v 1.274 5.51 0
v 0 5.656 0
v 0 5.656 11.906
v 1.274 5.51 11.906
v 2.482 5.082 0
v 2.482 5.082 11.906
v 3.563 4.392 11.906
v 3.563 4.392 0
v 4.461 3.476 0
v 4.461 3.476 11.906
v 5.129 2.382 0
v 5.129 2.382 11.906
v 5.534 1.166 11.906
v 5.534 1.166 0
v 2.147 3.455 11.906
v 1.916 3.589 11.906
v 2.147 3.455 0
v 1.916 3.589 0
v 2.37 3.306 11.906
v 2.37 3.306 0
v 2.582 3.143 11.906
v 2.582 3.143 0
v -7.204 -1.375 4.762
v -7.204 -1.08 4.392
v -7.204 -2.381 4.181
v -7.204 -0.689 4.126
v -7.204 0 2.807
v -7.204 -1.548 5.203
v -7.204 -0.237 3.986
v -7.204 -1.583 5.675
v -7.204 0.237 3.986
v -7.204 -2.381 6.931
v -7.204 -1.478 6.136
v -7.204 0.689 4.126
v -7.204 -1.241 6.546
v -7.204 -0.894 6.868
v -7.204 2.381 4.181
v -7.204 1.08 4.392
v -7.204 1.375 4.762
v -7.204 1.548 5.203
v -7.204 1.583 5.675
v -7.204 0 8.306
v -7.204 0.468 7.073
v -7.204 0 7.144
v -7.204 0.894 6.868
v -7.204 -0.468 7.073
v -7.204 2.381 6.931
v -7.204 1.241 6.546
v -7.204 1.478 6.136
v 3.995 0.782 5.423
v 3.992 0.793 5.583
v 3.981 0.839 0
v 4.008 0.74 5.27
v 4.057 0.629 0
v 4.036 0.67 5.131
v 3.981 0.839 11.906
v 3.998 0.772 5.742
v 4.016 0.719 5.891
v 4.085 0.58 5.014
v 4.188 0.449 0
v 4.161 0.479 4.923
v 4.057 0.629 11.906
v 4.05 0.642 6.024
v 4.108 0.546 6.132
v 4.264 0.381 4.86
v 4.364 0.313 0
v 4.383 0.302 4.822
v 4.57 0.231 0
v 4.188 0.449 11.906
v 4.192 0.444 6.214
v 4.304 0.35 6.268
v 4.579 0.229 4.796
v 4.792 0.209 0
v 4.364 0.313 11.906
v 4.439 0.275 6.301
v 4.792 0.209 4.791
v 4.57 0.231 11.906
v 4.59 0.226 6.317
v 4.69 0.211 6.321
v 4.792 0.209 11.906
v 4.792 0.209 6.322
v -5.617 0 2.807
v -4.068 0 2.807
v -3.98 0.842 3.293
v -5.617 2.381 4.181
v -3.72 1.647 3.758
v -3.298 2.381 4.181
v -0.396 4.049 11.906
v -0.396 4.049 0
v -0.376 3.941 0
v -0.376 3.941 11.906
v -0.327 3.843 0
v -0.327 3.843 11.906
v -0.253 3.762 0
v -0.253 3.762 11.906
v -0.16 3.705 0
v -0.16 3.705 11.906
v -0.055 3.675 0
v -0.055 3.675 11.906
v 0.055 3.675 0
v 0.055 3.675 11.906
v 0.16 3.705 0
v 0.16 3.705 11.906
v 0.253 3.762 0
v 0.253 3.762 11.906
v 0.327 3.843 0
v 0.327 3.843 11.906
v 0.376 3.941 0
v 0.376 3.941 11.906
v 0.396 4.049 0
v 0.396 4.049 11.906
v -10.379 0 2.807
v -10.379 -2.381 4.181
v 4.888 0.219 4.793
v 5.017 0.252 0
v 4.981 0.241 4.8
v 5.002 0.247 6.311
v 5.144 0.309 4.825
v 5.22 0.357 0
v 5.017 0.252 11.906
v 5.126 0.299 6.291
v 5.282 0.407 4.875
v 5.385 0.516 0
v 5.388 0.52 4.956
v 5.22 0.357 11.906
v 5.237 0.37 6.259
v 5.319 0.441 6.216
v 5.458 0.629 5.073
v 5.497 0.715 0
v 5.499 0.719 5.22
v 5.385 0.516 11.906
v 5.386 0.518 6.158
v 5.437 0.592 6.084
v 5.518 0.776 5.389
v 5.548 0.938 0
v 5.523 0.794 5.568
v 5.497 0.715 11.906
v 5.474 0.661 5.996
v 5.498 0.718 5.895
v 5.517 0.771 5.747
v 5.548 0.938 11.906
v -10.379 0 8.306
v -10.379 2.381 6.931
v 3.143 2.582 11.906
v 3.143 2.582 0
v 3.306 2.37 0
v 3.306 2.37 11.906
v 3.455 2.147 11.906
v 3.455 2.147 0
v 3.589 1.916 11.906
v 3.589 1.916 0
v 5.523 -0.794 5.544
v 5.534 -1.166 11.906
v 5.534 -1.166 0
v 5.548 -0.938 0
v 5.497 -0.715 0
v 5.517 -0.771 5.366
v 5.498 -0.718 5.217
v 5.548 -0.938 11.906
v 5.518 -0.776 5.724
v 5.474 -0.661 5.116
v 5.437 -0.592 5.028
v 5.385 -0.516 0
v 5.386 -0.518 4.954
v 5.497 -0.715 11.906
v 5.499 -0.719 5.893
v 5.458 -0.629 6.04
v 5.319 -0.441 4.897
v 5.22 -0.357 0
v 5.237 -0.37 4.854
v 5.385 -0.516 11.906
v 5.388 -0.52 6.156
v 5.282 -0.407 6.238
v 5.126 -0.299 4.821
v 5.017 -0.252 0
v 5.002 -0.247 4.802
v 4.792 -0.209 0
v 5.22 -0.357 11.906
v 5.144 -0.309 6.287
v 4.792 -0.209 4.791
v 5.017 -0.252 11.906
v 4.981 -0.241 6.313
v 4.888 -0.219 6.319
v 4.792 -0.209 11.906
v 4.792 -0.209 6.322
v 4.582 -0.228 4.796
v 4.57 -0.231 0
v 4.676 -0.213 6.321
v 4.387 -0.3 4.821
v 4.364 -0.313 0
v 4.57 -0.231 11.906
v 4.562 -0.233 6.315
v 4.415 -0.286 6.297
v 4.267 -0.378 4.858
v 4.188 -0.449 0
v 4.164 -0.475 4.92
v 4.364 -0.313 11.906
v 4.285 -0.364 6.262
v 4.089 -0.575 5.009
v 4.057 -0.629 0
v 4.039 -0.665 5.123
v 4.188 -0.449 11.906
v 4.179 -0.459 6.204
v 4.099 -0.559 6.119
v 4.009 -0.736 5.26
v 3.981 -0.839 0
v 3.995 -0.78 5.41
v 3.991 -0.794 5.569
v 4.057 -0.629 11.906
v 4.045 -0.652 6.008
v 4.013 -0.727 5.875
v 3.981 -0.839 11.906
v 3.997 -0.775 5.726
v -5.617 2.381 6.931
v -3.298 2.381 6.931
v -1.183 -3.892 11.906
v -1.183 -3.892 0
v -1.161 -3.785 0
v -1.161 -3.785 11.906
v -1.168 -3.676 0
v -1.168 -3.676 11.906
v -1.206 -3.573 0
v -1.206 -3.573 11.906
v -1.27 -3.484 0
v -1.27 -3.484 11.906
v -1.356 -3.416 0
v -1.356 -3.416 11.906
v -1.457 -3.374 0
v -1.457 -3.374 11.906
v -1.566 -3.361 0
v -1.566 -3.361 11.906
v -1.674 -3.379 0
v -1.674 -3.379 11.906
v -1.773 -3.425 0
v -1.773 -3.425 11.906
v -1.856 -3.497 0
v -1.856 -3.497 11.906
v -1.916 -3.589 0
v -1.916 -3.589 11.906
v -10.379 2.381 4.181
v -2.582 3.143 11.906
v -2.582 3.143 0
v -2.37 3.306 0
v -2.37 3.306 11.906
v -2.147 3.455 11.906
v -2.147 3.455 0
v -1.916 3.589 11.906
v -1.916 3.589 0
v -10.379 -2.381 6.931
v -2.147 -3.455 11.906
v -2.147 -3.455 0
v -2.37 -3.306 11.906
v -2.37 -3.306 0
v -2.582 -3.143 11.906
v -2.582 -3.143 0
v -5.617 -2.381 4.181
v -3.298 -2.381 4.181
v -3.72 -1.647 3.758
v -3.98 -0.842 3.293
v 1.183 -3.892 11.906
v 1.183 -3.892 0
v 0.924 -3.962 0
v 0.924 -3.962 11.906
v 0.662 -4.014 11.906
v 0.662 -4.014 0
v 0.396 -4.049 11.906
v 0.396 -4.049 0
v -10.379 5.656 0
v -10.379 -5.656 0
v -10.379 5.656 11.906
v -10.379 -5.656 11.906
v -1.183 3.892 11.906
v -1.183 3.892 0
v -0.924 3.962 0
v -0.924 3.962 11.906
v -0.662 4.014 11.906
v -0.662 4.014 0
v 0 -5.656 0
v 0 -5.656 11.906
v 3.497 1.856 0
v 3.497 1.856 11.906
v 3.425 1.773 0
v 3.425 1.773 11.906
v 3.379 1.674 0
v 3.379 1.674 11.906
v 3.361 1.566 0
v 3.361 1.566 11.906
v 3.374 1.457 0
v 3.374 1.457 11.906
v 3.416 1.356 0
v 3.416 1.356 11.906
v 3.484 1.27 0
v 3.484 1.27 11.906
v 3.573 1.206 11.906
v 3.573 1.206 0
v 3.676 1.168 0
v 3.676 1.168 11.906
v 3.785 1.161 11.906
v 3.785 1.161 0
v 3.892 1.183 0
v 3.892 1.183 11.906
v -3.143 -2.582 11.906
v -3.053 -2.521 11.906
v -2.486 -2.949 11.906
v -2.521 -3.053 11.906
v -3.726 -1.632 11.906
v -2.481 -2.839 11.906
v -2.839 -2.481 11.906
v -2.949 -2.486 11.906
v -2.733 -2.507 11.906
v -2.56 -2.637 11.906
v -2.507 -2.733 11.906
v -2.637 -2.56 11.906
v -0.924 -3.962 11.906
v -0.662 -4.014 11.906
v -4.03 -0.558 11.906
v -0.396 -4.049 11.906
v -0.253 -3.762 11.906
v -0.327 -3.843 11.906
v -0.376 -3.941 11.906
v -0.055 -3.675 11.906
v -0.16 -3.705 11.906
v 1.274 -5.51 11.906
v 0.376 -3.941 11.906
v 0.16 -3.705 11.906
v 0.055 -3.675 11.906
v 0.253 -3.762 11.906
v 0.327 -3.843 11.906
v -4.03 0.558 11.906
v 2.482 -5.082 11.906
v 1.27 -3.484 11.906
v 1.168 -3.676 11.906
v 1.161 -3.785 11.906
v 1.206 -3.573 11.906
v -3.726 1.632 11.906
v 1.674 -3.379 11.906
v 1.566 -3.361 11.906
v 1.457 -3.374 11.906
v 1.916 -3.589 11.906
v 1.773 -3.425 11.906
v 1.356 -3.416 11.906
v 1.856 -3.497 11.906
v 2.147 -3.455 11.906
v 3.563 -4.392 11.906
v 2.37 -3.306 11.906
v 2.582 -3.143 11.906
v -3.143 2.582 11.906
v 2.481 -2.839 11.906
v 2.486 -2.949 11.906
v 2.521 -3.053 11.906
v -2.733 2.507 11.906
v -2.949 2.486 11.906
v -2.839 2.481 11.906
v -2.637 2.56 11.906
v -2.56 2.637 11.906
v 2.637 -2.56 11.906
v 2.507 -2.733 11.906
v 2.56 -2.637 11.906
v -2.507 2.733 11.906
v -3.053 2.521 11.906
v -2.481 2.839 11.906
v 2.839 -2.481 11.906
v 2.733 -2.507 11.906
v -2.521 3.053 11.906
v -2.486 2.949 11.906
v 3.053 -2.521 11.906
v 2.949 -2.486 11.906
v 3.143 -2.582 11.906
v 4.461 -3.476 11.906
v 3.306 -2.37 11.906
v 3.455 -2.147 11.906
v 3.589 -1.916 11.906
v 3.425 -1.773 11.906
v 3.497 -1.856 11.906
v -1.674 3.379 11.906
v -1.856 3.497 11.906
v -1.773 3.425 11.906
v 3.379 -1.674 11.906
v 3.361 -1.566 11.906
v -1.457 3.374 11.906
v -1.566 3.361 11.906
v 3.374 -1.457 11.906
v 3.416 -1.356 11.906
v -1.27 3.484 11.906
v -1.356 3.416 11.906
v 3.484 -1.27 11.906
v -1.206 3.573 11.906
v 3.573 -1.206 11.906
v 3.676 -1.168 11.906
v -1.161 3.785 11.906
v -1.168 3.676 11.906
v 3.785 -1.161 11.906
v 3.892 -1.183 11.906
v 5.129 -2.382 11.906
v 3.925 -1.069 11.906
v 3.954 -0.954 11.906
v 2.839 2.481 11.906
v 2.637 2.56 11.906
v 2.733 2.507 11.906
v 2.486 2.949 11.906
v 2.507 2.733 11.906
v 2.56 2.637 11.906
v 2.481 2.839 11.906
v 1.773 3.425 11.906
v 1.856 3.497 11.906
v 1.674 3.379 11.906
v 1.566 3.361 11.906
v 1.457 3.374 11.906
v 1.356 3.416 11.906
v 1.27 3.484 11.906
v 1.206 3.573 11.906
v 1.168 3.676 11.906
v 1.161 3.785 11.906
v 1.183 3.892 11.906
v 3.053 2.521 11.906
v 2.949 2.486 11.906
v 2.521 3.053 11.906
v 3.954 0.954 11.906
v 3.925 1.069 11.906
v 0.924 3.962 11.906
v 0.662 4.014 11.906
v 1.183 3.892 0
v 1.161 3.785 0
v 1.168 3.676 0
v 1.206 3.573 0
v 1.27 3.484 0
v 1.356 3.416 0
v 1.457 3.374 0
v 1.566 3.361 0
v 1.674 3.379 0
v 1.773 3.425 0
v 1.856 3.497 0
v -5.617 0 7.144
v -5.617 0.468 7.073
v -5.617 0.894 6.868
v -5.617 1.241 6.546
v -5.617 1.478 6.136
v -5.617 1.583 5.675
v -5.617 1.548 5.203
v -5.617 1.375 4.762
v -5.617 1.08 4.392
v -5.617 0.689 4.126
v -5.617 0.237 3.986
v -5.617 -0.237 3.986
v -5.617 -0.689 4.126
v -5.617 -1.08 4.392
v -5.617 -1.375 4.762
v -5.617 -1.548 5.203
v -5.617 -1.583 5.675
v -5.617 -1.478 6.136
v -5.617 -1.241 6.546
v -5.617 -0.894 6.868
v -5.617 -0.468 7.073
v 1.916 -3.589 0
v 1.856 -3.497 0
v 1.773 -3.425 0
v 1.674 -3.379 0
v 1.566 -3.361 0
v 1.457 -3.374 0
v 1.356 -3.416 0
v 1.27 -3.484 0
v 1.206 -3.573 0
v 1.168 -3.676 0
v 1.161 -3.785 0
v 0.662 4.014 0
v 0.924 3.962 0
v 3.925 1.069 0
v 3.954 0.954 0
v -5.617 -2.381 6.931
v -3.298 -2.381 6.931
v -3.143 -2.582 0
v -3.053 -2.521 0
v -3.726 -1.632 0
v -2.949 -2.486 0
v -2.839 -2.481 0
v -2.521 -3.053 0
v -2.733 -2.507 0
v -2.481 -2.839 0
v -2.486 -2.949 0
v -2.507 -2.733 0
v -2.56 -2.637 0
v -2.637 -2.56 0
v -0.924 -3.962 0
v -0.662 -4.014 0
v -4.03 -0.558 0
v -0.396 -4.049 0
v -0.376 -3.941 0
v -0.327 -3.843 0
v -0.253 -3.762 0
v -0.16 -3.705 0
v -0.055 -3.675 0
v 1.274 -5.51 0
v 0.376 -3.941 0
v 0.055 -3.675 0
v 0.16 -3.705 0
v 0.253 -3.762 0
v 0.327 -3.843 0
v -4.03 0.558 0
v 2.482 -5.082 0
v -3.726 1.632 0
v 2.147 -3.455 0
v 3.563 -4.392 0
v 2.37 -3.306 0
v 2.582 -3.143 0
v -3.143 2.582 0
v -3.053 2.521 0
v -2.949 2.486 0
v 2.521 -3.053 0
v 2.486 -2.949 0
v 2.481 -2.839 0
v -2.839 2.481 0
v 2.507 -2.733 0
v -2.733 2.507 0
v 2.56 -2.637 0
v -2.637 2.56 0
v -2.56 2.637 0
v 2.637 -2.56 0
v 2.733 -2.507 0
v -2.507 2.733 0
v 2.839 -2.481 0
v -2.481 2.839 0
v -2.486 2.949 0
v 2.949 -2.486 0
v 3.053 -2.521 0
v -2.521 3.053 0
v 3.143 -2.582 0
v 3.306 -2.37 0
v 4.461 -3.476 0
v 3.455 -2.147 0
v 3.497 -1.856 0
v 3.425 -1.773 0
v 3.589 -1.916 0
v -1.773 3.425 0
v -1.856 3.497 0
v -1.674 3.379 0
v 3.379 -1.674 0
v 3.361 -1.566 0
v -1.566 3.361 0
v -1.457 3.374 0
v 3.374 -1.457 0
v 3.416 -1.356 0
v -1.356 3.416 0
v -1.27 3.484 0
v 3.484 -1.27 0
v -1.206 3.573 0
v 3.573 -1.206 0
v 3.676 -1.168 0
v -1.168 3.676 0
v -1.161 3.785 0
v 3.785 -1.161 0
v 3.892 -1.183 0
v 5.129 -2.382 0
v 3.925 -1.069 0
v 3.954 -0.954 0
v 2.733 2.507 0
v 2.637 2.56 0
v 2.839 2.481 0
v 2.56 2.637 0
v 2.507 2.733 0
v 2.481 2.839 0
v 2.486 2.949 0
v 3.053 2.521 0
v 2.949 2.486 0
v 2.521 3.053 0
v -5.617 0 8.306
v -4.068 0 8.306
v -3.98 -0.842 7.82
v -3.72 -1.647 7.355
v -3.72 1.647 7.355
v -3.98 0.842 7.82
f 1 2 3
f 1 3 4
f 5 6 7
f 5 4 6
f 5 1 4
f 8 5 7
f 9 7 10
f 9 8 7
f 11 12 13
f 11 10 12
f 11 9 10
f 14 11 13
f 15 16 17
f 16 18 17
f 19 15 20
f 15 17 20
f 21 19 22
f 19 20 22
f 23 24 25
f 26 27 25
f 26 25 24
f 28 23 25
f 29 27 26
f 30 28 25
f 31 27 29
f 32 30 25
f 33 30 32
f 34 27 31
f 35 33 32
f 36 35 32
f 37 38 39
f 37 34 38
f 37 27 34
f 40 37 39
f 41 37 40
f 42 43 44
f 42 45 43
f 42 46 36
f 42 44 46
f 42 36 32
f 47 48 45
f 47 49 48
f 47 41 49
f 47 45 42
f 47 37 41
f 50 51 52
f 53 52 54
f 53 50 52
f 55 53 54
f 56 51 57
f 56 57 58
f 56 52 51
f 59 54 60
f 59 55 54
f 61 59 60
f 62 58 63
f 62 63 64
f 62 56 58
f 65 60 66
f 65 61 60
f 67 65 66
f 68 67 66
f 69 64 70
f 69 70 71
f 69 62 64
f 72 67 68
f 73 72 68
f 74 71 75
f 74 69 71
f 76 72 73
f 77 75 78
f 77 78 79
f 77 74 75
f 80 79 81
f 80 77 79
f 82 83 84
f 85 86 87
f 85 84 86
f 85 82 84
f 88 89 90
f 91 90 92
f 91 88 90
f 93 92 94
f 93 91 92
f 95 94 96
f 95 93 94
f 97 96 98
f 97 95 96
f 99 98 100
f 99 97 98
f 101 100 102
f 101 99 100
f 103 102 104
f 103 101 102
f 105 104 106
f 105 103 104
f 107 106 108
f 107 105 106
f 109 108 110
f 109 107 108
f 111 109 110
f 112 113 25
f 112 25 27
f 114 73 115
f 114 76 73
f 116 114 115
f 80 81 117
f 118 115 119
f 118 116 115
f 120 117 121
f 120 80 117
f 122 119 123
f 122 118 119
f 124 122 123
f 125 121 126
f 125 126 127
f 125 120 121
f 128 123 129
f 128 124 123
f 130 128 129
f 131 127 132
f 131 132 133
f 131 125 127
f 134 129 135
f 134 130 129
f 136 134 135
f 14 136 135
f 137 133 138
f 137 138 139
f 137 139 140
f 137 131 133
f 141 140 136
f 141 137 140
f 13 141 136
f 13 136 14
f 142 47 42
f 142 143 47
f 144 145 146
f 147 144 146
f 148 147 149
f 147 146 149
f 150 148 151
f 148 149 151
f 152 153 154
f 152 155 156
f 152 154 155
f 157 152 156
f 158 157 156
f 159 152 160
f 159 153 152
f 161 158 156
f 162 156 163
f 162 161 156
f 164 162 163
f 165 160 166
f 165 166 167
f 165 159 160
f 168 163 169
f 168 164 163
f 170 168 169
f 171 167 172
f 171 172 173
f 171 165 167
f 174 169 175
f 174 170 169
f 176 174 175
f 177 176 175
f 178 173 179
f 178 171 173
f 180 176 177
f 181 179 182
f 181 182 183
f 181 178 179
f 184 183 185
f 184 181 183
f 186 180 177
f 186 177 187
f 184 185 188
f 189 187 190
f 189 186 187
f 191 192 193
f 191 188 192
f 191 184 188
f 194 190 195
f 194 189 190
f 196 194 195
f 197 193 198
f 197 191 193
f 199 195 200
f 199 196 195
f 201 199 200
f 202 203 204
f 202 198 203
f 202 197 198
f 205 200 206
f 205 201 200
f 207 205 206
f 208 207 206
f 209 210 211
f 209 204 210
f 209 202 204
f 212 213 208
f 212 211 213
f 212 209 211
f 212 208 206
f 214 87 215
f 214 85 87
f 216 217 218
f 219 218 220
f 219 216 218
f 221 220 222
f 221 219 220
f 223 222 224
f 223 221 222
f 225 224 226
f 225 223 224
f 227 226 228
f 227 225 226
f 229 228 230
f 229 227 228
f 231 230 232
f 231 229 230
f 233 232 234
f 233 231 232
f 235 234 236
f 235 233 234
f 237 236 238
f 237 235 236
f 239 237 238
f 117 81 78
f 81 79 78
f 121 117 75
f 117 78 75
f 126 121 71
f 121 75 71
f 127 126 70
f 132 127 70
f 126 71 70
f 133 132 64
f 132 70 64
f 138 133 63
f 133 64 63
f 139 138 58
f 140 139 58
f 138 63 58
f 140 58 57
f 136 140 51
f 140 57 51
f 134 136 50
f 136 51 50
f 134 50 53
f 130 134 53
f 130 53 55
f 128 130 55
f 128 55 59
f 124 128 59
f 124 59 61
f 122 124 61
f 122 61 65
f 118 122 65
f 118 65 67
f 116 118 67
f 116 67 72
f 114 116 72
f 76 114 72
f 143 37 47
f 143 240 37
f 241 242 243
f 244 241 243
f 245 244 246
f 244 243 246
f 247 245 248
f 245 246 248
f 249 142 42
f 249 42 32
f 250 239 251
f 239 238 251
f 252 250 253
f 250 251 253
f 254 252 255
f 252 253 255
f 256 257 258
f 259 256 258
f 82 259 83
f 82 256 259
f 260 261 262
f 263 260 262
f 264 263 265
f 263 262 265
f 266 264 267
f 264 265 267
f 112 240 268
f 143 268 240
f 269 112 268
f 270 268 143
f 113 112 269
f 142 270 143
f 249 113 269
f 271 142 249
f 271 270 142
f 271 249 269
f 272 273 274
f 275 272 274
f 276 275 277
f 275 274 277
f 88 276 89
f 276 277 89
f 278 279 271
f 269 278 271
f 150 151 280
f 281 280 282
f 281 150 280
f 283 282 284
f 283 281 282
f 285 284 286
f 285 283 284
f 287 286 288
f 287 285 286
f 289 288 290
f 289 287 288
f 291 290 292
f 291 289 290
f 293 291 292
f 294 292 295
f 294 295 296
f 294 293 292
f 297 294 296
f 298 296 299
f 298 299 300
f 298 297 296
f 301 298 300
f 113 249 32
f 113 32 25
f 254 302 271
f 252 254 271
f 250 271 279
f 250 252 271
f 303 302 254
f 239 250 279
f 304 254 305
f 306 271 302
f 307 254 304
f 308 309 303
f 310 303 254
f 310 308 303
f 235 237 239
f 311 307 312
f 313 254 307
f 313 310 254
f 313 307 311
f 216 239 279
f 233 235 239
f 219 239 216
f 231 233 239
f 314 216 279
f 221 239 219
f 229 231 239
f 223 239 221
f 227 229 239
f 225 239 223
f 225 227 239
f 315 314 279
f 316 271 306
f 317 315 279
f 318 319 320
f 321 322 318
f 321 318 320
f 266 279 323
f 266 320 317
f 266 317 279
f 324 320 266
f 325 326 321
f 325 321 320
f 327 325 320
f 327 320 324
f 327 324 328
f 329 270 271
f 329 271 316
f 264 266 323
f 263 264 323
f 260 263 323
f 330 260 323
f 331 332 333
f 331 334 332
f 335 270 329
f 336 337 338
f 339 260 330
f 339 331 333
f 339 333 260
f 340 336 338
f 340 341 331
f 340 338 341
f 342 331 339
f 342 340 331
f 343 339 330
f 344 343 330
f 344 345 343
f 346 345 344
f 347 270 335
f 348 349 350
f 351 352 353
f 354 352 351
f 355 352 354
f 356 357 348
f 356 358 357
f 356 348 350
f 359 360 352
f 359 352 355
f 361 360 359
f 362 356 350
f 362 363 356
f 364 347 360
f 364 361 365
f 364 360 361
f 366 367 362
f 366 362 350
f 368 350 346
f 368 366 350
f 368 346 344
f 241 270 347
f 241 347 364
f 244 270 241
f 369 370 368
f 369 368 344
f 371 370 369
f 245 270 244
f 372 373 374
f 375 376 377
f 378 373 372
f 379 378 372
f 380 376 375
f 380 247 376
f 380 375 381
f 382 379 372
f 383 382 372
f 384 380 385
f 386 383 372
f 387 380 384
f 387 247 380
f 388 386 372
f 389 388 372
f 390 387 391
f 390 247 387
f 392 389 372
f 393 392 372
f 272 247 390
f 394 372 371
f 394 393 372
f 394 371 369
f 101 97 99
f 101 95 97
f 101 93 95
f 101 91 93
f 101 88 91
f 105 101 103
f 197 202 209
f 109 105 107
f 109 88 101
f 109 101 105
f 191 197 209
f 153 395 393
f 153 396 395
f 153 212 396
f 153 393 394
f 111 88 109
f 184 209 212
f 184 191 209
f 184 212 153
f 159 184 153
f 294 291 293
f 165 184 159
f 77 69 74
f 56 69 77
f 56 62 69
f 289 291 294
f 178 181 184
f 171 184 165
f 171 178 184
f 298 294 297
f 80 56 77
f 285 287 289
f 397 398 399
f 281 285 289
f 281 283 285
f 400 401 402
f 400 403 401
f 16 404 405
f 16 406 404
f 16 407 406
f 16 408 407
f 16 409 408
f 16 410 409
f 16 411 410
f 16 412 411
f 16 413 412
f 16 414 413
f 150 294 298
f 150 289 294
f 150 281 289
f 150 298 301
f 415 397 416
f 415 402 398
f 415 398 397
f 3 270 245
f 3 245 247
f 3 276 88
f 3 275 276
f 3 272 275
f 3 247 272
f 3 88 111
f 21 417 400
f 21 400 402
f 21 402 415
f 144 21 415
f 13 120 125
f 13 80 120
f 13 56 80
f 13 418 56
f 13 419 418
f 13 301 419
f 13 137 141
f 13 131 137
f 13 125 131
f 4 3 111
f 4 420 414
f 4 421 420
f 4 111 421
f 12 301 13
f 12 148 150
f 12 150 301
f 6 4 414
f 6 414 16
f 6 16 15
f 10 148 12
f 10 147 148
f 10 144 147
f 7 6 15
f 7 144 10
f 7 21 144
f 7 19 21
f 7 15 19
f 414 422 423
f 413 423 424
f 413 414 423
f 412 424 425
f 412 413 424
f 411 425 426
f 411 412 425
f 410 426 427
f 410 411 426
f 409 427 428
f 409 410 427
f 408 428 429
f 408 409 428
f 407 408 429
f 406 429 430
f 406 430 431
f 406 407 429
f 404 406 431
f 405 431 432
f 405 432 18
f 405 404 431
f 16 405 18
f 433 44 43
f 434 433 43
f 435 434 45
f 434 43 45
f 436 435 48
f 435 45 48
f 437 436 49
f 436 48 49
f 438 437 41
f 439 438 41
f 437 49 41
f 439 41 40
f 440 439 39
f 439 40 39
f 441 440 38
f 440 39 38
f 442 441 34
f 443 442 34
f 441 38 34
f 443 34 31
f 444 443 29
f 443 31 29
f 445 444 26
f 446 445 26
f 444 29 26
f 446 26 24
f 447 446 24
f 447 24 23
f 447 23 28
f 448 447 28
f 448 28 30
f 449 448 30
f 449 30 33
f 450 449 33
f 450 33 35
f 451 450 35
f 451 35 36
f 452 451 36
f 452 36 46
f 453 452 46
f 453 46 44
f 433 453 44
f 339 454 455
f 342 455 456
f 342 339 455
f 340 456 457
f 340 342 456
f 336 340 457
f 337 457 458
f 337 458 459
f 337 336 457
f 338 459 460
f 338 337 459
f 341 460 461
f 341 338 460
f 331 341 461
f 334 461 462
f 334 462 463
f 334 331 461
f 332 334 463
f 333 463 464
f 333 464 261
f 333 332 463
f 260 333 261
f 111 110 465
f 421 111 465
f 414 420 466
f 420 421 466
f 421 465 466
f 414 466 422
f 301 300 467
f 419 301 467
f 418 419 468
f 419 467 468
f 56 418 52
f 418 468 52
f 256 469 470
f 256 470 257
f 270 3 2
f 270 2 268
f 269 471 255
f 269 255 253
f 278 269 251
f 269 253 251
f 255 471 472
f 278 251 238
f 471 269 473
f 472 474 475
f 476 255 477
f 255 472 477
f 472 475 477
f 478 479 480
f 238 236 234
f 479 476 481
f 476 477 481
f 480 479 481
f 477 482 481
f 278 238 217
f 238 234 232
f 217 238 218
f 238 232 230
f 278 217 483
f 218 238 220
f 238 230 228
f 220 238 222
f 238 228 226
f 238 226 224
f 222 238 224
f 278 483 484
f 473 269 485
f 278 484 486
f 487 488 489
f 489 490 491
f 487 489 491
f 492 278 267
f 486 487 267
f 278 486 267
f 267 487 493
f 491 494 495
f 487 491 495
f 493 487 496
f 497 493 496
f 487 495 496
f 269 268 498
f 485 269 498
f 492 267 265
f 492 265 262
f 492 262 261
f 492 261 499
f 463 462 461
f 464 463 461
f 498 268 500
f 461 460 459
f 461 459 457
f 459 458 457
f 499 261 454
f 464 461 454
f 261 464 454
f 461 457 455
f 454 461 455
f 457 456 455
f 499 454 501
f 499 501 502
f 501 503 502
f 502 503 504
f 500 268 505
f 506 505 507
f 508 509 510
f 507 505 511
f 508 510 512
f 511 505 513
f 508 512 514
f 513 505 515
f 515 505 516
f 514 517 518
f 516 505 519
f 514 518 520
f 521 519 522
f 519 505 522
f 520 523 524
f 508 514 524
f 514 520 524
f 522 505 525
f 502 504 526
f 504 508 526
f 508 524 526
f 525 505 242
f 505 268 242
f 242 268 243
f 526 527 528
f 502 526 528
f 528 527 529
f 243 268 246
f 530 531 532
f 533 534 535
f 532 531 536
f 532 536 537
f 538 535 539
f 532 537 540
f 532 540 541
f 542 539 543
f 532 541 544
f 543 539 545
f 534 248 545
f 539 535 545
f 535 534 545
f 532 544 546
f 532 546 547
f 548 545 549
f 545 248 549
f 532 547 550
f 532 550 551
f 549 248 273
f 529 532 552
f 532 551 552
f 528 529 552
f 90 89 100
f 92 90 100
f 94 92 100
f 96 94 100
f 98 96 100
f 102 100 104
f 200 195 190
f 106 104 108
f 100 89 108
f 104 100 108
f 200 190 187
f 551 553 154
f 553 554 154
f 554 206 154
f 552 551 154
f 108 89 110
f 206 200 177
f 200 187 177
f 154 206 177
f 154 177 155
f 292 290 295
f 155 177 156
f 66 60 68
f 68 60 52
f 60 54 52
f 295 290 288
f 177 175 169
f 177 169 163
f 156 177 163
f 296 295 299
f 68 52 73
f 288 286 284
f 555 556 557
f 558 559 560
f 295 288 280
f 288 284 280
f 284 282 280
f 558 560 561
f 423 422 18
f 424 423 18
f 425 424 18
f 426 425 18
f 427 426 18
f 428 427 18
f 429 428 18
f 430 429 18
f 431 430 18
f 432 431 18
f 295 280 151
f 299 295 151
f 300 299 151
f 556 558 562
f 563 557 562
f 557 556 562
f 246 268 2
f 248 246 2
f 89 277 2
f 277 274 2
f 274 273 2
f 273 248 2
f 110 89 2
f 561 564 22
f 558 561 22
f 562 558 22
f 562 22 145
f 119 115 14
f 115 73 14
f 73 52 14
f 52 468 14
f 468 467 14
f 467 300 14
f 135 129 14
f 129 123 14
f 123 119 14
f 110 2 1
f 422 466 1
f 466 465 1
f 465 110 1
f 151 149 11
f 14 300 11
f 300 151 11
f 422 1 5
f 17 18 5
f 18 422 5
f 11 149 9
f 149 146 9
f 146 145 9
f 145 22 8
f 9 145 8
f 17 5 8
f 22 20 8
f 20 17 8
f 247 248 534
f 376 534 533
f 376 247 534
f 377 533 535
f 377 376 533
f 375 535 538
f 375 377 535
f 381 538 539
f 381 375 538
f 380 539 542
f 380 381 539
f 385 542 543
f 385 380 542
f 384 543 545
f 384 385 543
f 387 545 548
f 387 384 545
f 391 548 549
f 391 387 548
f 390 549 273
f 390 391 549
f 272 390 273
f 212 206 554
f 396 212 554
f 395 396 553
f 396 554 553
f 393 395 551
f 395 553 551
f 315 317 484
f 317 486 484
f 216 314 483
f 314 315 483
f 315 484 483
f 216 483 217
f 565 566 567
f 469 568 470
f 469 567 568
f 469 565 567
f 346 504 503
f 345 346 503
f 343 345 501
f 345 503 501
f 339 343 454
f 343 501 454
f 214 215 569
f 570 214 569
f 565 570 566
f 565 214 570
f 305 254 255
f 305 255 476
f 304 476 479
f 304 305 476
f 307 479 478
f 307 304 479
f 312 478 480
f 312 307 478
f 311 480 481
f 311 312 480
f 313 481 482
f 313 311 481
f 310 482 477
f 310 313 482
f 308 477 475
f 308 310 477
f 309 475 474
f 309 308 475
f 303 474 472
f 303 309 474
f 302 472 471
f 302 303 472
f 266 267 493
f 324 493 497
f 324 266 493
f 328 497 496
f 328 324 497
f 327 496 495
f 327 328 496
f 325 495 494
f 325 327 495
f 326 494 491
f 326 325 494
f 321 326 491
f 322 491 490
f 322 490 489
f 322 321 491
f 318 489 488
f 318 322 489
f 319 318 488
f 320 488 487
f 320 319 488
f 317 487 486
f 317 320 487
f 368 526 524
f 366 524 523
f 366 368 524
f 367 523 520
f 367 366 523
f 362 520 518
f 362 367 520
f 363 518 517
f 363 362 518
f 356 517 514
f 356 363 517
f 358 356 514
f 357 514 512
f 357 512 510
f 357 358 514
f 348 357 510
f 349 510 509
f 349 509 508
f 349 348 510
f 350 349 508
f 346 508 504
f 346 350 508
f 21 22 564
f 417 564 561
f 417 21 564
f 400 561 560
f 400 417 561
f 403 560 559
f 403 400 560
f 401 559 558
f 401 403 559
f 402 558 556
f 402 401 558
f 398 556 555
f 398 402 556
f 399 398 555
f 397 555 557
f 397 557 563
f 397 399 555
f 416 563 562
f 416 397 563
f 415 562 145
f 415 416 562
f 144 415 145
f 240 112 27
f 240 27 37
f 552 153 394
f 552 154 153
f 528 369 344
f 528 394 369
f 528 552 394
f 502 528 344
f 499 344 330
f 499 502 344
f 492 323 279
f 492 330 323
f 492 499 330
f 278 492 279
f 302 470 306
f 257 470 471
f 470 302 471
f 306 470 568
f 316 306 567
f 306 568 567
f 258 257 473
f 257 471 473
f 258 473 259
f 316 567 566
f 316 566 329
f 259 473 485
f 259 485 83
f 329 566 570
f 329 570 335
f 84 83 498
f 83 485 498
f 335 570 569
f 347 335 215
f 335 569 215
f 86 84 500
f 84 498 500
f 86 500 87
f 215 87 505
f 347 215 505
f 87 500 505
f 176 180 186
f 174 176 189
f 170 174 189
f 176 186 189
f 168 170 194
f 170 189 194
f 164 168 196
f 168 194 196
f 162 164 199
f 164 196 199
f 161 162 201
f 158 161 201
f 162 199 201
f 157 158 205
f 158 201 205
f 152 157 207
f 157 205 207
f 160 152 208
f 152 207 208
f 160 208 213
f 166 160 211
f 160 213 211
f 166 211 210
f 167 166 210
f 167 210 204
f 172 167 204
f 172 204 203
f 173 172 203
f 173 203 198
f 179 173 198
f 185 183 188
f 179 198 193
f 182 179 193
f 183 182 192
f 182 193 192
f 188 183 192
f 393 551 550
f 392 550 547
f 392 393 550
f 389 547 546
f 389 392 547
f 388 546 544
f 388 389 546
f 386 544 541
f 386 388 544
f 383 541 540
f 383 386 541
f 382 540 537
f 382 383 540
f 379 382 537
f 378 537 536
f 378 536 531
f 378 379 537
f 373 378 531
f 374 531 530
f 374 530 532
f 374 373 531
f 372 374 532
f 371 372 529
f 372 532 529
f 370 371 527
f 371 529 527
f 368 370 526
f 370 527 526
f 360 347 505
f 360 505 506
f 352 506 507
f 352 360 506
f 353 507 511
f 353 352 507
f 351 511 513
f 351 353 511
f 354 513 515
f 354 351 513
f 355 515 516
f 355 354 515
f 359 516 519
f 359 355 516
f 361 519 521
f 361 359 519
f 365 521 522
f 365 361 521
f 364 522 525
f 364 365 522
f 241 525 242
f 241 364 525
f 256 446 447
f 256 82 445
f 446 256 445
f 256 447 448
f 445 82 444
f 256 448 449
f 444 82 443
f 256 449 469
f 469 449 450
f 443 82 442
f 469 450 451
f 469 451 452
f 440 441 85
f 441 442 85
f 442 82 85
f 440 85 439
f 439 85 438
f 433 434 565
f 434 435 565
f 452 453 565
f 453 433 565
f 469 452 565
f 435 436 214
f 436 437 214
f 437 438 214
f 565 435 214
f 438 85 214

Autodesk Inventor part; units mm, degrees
ref_plane "YZ Plane" through (0, 0, 0) normal (1, 0, 0) x (0, 1, 0)
ref_plane "XZ Plane" through (0, 0, 0) normal (0, 1, 0) x (-1, 0, 0)
ref_plane "XY Plane" through (0, 0, 0) normal (0, 0, 1) x (1, 0, 0)
sketch "Sketch1" plane through (0, 0, 0) normal (0, 0, 1) x (1, 0, 0)
  arc A0 (4.0641, 0.1774) -> (4.0641, -0.1774) centre (0, 0) ccw
  arc A1 (5.6501, 0.2467) -> (5.6501, -0.2467) centre (0, 0) ccw
  line L0 (4.0641, -0.1774) -> (5.6501, -0.2467)
  line L1 (4.0641, 0.1774) -> (5.6501, 0.2467)
  dimension "d0" = 8.1359
  dimension "d13" = 5
  dimension "d26" = 1.5875
extrude "Extrusion3" add sketch "Sketch1" along normal blind 11.9062
fillet "Fillet4" radius 0.7937 4 edges at (5.6501, 0.2467, 5.9531) (4.0641, 0.1774, 5.9531) (4.0641, -0.1774, 5.9531) (5.6501, -0.2467, 5.9531)
sketch "Sketch4" plane through (0, 0, 11.9062) normal (0, 0, 1) x (1, 0, 0)
  arc A0 (5.534, 1.1658) -> (5.534, -1.1658) centre (0, 0) ccw projected
  arc A1 (0, 5.6555) -> (0, -5.6555) centre (0, 0) ccw
  line L0 (0, 5.6555) -> (-10.3791, 5.6555)
  line L1 (-10.3791, 5.6555) -> (-10.3791, -5.6555)
  line L2 (0, -5.6555) -> (-10.3791, -5.6555)
  dimension "d192" = 10.3791
extrude "Extrusion5" add sketch "Sketch4" against normal up to surface (11.9062 mm away)
sketch "Sketch8" plane through (0, 0, 11.9062) normal (0, 0, 1) x (1, 0, 0)
  arc A0 (3.9806, 0.8386) -> (3.9806, -0.8386) centre (0, 0) ccw projected
  circle A1 centre (0, 4.068) radius 0.3969
  circle A2 centre (0, -4.068) radius 0.3969
  circle A3 centre (-1.5567, 3.7583) radius 0.3969
  circle A4 centre (-1.5567, -3.7583) radius 0.3969
  circle A5 centre (-2.8765, 2.8765) radius 0.3969
  circle A6 centre (-2.8765, -2.8765) radius 0.3969
  circle A7 centre (1.5567, 3.7583) radius 0.3969
  circle A8 centre (1.5567, -3.7583) radius 0.3969
  circle A9 centre (2.8765, 2.8765) radius 0.3969
  circle A10 centre (2.8765, -2.8765) radius 0.3969
  arc A11 (3.9806, 0.8386) -> (3.9806, -0.8386) centre (0, 0) ccw projected
  circle A12 centre (3.7583, 1.5567) radius 0.3969
  circle A13 centre (3.7583, -1.5567) radius 0.3969
  point P0 (4.7625, 0)
  dimension "d71" = 4.7625
  dimension "d72" = 0.7937
  dimension "d74" = 0.7937
  dimension "d75" = 0.7937
  dimension "d76" = 22.5
  dimension "d77" = 0.7937
  dimension "d78" = 22.5
  dimension "d110" = 0.7937
  dimension "d111" = 0.7937
  dimension "d112" = 22.5
  dimension "d113" = 22.5
  dimension "d158" = 0.7937
  dimension "d159" = 0.7937
  dimension "d160" = 22.5
  dimension "d161" = 22.5
  dimension "d165" = 0.7937
  dimension "d166" = 0.7937
  dimension "d167" = 22.5
  dimension "d168" = 22.5
  dimension "d171" = 22.5
  dimension "d172" = 0.7937
  dimension "d173" = 0.7937
  dimension "d174" = 22.5
  dimension "d191" = 45
sketch "Sketch22" plane through (-10.3791, -5.6555, 11.9062) normal (-1, 0, 0) x (0, 0, 1)
  line L0 (-4.9752, 8.0367) -> (-3.6004, 5.6555)
  line L1 (-3.6004, 5.6555) -> (-4.9752, 3.2742)
  line L2 (-4.9752, 3.2742) -> (-7.7248, 3.2742)
  line L3 (-7.7248, 3.2742) -> (-9.0996, 5.6555)
  line L4 (-9.0996, 5.6555) -> (-7.7248, 8.0367)
  line L5 (-7.7248, 8.0367) -> (-4.9752, 8.0367)
  line L6 (0, 11.3109) -> (-11.9062, 11.3109) projected
  line L7 (0, 11.3109) -> (0, 0) projected
  point P0 (-11.9062, 5.6555)
  point P1 (-6.35, 5.6555)
  dimension "d145" = 4.7625
  dimension "d146" = 5.6555
  dimension "d147" = 6.35
extrude "Extrusion28" cut sketch "Sketch22" against normal up to surface
extrude "Extrusion36" add sketch "Sketch8" against normal up to surface (11.9062 mm away)
ref_plane "Work Plane3" through (-7.2041, -5.6555, 11.9062) normal (-1, 0, 0) x (0, 0, 1)
sketch "Sketch28" plane through (-7.2041, -5.6555, 11.9062) normal (-1, 0, 0) x (0, 0, 1)
  line L0 (-4.9752, 8.0367) -> (-3.6004, 5.6555)
  line L1 (-3.6004, 5.6555) -> (-4.9752, 3.2742)
  line L2 (-4.9752, 3.2742) -> (-7.7248, 3.2742)
  line L3 (-7.7248, 3.2742) -> (-9.0996, 5.6555)
  line L4 (-9.0996, 5.6555) -> (-7.7248, 8.0367)
  line L5 (-7.7248, 8.0367) -> (-4.9752, 8.0367)
  line L6 (-7.7248, 8.0367) -> (-4.9752, 8.0367) projected
  line L7 (-9.0996, 5.6555) -> (-7.7248, 8.0367) projected
  line L8 (-3.6004, 5.6555) -> (-4.9752, 3.2742) projected
  circle A0 centre (-6.35, 5.6555) radius 1.5875
  point P0 (-11.9062, 5.6555)
  dimension "d194" = 3.175
extrude "Extrusion37" add sketch "Sketch28" against normal blind 1.5875
sketch "Sketch29" plane through (-7.2041, -5.6555, 11.9062) normal (-1, 0, 0) x (0, 0, 1)
  circle A0 centre (-6.35, 5.6555) radius 1.5875 projected
  circle A1 centre (-6.35, 5.6555) radius 0.7937
  point P0 (-11.9062, 5.6555)
  dimension "d197" = 1.5875
extrude "Extrusion38" cut sketch "Sketch29" against normal through all contours A1
equation "\"d72\" = d75"
equation "\"d74\" = d75"
equation "\"d77\" = d75"
equation "\"d110\" = d75"
equation "\"d111\" = d75"
equation "\"d158\" = d75"
equation "\"d159\" = d75"
equation "\"d165\" = d75"
equation "\"d166\" = d75"
properties part number "claww"
